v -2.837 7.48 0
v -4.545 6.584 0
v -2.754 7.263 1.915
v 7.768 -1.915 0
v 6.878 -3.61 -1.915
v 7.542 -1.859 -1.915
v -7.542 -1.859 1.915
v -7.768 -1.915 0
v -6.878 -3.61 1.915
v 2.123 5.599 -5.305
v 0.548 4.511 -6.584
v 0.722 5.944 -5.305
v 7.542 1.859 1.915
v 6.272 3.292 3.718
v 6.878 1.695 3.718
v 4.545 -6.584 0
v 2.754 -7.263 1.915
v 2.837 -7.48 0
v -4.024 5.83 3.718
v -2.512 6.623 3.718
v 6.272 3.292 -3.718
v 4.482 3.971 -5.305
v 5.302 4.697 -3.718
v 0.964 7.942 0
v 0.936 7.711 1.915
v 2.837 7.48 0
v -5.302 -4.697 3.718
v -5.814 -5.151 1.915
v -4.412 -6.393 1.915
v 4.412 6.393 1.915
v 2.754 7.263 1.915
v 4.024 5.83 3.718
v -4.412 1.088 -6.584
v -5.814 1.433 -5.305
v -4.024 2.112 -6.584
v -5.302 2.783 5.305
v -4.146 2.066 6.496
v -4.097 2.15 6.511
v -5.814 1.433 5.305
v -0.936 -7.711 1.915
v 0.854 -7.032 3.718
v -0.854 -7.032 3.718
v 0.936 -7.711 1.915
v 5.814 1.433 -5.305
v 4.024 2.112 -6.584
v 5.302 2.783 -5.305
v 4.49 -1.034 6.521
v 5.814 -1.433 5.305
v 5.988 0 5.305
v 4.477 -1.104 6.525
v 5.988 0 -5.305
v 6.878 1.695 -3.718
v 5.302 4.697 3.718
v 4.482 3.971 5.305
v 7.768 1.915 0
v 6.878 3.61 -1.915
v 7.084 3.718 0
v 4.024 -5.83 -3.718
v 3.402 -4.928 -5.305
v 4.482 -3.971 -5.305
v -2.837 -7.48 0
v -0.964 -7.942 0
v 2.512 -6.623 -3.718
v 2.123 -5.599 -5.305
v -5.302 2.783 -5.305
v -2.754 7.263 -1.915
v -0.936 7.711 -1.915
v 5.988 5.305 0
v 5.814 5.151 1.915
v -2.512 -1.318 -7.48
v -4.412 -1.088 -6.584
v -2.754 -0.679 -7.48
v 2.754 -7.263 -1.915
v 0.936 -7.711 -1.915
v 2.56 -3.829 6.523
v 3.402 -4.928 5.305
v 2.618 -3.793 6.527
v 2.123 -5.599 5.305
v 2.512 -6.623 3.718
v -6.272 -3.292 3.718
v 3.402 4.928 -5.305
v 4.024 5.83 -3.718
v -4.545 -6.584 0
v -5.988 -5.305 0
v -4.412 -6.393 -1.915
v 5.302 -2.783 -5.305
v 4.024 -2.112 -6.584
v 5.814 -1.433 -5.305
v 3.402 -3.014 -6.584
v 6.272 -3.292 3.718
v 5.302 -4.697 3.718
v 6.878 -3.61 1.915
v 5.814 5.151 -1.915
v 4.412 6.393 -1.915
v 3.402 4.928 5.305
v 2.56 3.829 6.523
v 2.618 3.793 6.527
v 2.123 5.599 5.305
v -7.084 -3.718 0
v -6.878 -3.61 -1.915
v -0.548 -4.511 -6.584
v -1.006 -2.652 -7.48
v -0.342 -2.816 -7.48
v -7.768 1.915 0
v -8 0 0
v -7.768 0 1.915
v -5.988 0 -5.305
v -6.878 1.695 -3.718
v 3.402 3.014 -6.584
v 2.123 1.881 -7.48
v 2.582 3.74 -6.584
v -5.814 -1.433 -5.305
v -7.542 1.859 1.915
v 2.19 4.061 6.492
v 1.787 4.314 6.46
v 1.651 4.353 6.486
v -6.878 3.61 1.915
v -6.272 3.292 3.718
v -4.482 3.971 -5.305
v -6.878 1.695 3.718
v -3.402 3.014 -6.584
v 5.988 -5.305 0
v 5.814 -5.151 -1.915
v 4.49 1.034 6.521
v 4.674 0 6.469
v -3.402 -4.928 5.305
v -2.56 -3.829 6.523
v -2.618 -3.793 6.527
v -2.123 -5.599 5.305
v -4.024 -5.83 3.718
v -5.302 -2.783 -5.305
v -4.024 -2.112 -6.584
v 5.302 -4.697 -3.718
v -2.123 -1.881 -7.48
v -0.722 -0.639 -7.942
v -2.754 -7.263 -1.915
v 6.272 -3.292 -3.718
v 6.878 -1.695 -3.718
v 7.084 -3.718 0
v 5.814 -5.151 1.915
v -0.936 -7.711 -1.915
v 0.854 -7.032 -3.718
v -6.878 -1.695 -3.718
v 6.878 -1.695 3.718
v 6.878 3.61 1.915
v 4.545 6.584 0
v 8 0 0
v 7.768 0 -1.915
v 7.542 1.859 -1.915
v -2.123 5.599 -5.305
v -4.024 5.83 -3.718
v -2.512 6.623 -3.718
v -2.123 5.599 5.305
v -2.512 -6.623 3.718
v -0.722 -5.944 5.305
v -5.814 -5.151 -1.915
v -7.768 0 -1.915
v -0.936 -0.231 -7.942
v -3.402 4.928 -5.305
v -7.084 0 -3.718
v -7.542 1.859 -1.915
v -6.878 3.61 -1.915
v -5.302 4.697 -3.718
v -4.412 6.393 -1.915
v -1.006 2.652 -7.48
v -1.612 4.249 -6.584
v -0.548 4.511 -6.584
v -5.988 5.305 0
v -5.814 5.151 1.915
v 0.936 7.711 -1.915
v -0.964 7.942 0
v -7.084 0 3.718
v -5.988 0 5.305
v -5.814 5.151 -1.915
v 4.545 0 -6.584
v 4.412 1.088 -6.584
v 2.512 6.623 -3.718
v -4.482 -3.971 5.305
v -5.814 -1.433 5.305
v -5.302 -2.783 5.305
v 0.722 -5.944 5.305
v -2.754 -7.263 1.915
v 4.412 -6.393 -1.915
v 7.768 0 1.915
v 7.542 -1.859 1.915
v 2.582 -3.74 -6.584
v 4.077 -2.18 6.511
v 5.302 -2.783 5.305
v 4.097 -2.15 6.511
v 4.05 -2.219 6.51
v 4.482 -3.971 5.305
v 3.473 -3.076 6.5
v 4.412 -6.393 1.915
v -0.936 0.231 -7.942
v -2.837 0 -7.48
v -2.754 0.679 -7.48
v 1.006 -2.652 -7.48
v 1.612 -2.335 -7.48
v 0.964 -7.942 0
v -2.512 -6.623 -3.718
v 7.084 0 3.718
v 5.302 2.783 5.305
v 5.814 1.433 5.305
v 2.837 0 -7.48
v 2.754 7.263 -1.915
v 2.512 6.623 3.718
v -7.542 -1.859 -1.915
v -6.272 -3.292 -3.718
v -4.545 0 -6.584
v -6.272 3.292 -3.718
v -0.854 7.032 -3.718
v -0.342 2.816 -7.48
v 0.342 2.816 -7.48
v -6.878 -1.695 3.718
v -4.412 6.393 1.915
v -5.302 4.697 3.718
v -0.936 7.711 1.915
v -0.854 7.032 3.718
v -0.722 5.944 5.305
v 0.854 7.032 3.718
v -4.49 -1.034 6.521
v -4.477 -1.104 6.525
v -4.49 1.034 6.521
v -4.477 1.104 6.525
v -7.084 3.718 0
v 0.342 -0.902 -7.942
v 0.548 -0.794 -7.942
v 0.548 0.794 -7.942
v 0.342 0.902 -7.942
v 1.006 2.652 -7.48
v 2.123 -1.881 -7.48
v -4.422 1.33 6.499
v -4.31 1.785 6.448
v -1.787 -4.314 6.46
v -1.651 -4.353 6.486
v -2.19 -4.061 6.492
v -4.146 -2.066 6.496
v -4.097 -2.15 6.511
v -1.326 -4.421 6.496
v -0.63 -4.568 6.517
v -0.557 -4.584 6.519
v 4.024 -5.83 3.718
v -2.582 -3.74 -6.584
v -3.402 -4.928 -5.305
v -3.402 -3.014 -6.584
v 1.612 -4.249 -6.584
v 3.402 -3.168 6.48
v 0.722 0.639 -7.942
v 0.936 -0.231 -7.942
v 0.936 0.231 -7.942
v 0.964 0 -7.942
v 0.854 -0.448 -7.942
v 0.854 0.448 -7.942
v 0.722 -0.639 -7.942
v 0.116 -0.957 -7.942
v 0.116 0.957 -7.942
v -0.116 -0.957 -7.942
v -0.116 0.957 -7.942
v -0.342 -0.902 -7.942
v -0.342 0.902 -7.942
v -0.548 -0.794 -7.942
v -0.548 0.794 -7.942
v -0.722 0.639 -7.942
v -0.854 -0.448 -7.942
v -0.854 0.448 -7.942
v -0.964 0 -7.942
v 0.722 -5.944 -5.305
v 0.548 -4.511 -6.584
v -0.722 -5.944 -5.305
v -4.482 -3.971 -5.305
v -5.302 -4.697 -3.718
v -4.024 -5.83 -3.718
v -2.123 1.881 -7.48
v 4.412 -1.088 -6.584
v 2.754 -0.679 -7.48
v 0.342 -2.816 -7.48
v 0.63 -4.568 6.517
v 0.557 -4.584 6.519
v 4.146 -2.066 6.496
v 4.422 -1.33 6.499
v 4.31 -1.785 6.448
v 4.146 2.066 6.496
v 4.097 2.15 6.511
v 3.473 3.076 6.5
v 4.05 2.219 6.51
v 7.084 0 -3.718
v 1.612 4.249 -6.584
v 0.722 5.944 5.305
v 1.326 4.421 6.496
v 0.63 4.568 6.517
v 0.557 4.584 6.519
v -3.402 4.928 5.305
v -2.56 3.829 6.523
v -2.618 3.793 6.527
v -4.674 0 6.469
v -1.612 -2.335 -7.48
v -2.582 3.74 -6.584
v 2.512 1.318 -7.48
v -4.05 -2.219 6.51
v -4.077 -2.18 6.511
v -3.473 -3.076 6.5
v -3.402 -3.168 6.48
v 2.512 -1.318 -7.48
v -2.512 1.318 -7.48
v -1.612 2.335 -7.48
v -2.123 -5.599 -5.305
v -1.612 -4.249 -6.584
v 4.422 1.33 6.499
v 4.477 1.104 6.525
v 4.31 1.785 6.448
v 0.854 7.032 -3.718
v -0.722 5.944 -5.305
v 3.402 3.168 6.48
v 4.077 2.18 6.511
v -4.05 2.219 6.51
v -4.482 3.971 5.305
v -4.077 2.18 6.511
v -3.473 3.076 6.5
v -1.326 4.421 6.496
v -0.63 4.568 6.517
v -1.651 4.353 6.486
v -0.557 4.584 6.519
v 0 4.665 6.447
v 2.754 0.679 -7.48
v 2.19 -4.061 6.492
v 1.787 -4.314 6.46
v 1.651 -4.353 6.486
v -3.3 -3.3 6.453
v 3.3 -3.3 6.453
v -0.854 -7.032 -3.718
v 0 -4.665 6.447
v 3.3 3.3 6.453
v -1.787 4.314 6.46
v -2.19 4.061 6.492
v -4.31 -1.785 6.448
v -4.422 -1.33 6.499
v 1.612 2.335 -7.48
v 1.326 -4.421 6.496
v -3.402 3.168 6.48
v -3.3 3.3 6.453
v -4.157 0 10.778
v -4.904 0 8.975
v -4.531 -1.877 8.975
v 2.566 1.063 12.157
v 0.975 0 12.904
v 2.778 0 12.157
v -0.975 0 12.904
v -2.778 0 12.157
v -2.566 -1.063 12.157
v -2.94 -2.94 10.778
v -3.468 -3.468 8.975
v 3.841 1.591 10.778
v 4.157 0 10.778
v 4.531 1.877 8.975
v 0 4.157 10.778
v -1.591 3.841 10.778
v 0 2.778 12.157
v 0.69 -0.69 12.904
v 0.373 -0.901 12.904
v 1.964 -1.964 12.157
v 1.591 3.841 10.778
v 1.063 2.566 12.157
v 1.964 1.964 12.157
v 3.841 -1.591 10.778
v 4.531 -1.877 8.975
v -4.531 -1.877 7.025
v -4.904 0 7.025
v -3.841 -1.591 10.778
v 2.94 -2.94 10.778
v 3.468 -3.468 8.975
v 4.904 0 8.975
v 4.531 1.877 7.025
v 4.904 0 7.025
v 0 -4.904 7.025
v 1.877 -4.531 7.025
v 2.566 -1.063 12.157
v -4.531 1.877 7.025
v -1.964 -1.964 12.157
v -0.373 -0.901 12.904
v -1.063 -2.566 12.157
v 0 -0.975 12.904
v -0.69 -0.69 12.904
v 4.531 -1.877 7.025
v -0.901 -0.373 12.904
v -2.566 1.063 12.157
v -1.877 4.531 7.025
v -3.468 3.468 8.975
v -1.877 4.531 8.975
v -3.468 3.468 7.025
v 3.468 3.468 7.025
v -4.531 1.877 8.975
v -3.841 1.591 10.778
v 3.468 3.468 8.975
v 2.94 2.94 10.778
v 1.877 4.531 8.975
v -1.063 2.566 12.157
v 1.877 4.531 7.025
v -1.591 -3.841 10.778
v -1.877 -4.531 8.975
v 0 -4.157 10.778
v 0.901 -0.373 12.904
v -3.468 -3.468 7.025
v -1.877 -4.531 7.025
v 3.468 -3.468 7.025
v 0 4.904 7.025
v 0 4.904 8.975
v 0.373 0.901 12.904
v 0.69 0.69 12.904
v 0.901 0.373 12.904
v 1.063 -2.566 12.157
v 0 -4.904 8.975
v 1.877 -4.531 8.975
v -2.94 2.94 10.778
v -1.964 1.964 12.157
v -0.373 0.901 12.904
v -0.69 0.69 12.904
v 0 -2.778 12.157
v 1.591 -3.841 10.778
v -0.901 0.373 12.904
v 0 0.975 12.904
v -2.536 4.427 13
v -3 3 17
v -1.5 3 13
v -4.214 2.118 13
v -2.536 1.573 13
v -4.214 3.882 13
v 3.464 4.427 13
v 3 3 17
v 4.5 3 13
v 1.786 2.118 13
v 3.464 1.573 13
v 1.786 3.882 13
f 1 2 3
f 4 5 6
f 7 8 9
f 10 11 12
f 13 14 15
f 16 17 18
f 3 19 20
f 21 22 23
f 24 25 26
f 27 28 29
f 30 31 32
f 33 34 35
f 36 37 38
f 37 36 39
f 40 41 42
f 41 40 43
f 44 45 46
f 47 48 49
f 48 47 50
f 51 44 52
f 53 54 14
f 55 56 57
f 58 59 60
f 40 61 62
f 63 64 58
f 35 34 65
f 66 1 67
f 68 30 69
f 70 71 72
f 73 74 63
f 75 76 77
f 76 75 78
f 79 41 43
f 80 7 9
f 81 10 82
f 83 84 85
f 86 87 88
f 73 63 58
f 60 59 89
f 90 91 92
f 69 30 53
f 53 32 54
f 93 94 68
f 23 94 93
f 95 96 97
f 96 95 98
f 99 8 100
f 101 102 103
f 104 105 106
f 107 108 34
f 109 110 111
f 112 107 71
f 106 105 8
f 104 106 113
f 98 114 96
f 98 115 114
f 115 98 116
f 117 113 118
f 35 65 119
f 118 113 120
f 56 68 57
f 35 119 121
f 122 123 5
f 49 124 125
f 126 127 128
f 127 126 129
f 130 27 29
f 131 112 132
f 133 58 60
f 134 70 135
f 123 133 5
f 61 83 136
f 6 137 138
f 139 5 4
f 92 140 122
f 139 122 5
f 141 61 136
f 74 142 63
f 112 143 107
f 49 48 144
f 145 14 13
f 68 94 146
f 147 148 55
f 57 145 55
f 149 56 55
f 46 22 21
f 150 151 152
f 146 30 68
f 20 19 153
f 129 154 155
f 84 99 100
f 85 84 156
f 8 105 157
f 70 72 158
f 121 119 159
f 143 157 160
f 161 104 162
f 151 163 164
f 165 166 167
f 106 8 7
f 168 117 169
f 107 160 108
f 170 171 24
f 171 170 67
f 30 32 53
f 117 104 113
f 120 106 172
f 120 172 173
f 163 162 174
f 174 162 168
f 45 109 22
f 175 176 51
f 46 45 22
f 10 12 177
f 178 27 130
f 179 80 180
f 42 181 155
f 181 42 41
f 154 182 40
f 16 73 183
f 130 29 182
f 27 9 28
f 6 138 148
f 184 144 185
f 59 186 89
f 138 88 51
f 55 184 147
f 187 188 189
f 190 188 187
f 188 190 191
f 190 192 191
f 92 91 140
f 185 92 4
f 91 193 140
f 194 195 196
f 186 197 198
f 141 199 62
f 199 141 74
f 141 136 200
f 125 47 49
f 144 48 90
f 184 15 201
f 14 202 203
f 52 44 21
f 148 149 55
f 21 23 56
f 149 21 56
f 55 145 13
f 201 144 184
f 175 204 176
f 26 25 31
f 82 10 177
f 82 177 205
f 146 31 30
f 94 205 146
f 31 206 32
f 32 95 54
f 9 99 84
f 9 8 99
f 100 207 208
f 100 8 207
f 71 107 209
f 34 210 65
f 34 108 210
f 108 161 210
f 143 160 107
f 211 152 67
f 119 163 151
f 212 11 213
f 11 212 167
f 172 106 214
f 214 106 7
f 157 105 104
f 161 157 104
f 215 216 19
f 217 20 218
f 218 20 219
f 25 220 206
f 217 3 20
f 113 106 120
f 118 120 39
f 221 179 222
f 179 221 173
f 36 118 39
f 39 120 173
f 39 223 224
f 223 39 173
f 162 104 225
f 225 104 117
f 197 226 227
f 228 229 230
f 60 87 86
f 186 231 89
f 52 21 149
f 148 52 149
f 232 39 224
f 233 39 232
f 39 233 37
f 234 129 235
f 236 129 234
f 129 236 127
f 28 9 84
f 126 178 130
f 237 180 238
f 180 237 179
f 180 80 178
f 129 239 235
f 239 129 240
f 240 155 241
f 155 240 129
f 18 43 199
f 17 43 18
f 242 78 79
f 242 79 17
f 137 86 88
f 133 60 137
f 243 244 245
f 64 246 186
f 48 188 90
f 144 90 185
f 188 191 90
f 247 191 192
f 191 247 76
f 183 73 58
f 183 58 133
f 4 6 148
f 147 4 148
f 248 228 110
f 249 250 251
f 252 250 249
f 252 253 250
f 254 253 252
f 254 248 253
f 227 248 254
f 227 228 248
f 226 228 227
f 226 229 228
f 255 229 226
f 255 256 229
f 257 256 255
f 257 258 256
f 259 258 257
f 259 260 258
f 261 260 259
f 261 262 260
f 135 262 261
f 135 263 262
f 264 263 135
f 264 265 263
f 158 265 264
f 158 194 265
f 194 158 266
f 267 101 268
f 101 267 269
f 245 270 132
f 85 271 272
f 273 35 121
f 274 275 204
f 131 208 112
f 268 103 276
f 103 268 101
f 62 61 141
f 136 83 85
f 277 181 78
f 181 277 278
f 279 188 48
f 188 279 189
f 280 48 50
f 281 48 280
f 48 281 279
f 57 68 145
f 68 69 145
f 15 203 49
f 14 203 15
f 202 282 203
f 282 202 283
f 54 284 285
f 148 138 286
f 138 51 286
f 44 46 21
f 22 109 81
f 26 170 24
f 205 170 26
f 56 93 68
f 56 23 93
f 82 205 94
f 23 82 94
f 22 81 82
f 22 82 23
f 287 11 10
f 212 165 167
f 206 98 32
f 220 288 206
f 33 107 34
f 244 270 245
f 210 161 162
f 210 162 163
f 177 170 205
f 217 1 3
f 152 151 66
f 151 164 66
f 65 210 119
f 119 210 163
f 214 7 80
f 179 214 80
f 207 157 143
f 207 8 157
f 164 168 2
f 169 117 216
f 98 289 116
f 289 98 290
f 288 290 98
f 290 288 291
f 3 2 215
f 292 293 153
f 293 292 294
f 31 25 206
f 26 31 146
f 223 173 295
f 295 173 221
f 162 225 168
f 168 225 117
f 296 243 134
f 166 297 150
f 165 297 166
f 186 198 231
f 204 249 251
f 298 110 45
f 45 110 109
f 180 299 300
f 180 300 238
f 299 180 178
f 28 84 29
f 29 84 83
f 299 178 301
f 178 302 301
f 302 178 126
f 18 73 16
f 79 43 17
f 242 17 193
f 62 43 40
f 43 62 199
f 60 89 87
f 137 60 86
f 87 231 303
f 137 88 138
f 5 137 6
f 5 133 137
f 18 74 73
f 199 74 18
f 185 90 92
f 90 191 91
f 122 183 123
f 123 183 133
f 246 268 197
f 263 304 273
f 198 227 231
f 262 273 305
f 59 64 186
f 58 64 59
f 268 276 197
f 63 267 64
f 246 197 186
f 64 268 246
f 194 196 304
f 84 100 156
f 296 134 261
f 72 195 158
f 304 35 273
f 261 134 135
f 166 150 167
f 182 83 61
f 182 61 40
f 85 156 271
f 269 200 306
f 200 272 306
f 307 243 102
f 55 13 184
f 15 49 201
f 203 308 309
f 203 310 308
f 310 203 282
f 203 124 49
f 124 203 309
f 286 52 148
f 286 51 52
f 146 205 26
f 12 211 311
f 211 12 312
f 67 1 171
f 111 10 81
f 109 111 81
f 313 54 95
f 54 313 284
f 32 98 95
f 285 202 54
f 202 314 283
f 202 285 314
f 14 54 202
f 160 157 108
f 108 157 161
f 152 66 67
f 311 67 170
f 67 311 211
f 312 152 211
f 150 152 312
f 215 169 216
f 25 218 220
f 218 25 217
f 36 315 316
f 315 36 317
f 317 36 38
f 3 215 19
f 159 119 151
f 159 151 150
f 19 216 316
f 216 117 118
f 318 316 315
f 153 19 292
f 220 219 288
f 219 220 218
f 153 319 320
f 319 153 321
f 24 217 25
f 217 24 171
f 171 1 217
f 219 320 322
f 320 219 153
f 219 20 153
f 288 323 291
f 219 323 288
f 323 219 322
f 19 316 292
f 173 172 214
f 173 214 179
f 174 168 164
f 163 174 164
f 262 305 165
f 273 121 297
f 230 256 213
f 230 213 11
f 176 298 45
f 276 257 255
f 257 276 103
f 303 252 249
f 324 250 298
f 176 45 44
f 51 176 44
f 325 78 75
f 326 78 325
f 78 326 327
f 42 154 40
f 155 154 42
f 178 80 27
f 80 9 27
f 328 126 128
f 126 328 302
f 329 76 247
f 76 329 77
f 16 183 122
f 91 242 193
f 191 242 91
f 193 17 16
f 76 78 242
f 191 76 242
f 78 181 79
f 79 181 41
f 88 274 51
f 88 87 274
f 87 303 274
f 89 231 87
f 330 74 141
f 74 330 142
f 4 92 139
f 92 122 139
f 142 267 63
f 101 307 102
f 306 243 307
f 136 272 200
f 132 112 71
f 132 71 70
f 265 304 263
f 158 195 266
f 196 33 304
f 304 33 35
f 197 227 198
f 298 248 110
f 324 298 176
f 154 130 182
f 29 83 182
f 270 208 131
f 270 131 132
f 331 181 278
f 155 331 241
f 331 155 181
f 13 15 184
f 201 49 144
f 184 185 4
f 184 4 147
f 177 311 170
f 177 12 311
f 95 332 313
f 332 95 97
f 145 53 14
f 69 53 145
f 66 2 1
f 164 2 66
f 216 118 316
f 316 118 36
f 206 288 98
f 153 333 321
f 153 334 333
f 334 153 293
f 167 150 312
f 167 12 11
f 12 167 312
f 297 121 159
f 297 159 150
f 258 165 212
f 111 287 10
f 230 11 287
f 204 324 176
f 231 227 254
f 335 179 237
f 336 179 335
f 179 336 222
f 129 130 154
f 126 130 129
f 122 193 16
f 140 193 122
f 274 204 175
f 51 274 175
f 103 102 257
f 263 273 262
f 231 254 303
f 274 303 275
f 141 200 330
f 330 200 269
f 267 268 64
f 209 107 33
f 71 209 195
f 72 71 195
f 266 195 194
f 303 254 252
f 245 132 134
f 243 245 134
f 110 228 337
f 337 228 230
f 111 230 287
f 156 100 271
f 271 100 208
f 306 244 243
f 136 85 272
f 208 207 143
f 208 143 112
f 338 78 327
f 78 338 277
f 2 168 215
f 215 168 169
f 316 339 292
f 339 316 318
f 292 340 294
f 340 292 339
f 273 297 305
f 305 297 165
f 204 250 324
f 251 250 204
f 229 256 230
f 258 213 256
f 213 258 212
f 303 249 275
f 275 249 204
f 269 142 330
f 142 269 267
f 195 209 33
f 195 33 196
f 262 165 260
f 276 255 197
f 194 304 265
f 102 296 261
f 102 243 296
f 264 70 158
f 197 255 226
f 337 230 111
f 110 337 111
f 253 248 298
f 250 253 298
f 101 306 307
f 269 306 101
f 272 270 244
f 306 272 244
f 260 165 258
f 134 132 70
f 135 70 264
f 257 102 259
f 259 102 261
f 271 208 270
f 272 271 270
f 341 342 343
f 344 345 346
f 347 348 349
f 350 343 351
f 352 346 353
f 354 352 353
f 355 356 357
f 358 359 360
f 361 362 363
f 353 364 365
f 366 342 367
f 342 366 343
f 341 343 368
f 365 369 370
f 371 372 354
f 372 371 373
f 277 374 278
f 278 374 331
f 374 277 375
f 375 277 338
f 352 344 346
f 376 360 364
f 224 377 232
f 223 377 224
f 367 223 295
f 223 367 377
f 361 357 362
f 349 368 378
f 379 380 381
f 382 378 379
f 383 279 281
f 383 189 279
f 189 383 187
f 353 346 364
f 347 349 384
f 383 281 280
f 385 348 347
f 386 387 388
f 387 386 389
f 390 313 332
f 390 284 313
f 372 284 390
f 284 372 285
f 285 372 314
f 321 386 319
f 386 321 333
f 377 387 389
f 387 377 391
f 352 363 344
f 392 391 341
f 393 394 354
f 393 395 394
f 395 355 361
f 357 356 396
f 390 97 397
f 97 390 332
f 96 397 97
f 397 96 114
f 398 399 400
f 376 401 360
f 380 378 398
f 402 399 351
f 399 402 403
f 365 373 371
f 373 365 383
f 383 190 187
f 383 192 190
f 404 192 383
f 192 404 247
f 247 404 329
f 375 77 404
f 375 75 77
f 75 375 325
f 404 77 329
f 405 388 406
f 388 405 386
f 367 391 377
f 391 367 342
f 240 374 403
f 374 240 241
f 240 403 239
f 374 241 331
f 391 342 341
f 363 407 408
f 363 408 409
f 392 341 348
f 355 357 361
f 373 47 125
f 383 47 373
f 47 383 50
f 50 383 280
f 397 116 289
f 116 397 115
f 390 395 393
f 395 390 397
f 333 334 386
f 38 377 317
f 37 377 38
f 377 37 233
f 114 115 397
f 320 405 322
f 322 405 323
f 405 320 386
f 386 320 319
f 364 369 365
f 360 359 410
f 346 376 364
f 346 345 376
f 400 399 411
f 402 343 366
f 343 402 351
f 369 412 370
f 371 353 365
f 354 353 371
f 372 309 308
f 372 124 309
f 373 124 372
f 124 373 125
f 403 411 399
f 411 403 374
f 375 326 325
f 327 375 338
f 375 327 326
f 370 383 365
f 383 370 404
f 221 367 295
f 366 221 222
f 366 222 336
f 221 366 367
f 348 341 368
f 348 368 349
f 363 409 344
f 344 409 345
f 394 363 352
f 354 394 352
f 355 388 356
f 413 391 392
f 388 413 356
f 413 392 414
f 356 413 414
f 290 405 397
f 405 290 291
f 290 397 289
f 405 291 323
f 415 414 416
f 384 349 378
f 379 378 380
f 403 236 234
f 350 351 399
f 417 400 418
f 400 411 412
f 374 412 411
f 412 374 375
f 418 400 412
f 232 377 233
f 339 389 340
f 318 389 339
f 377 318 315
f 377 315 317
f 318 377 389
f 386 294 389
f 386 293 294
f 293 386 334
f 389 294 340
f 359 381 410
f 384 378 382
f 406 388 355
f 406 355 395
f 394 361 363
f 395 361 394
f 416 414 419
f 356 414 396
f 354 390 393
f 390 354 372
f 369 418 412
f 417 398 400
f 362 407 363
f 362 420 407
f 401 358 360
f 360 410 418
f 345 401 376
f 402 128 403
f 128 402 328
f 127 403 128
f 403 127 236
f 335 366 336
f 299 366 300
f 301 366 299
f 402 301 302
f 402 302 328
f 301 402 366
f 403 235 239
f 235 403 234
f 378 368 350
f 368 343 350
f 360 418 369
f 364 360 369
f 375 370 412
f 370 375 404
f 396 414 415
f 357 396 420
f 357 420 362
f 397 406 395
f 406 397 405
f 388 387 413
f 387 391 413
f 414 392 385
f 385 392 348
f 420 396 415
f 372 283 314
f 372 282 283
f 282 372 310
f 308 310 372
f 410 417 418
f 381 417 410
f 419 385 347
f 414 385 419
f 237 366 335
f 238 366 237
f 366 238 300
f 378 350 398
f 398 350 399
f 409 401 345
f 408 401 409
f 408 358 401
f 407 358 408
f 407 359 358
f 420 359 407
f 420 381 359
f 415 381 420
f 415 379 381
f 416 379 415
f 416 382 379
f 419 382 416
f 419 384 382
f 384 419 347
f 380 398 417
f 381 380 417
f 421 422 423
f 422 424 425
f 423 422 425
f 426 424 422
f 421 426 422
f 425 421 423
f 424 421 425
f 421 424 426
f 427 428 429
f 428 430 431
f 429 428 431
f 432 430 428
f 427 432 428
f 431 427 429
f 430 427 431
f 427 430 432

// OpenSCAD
union() {
    sphere(r=8);
    translate([0,0,8]) sphere(r=5);
    translate([-3,3,13]) cone();
    translate([3,3,13]) cone();
}

module cone() {
    cylinder(h=4, r1=1.5, r2=0);
}
